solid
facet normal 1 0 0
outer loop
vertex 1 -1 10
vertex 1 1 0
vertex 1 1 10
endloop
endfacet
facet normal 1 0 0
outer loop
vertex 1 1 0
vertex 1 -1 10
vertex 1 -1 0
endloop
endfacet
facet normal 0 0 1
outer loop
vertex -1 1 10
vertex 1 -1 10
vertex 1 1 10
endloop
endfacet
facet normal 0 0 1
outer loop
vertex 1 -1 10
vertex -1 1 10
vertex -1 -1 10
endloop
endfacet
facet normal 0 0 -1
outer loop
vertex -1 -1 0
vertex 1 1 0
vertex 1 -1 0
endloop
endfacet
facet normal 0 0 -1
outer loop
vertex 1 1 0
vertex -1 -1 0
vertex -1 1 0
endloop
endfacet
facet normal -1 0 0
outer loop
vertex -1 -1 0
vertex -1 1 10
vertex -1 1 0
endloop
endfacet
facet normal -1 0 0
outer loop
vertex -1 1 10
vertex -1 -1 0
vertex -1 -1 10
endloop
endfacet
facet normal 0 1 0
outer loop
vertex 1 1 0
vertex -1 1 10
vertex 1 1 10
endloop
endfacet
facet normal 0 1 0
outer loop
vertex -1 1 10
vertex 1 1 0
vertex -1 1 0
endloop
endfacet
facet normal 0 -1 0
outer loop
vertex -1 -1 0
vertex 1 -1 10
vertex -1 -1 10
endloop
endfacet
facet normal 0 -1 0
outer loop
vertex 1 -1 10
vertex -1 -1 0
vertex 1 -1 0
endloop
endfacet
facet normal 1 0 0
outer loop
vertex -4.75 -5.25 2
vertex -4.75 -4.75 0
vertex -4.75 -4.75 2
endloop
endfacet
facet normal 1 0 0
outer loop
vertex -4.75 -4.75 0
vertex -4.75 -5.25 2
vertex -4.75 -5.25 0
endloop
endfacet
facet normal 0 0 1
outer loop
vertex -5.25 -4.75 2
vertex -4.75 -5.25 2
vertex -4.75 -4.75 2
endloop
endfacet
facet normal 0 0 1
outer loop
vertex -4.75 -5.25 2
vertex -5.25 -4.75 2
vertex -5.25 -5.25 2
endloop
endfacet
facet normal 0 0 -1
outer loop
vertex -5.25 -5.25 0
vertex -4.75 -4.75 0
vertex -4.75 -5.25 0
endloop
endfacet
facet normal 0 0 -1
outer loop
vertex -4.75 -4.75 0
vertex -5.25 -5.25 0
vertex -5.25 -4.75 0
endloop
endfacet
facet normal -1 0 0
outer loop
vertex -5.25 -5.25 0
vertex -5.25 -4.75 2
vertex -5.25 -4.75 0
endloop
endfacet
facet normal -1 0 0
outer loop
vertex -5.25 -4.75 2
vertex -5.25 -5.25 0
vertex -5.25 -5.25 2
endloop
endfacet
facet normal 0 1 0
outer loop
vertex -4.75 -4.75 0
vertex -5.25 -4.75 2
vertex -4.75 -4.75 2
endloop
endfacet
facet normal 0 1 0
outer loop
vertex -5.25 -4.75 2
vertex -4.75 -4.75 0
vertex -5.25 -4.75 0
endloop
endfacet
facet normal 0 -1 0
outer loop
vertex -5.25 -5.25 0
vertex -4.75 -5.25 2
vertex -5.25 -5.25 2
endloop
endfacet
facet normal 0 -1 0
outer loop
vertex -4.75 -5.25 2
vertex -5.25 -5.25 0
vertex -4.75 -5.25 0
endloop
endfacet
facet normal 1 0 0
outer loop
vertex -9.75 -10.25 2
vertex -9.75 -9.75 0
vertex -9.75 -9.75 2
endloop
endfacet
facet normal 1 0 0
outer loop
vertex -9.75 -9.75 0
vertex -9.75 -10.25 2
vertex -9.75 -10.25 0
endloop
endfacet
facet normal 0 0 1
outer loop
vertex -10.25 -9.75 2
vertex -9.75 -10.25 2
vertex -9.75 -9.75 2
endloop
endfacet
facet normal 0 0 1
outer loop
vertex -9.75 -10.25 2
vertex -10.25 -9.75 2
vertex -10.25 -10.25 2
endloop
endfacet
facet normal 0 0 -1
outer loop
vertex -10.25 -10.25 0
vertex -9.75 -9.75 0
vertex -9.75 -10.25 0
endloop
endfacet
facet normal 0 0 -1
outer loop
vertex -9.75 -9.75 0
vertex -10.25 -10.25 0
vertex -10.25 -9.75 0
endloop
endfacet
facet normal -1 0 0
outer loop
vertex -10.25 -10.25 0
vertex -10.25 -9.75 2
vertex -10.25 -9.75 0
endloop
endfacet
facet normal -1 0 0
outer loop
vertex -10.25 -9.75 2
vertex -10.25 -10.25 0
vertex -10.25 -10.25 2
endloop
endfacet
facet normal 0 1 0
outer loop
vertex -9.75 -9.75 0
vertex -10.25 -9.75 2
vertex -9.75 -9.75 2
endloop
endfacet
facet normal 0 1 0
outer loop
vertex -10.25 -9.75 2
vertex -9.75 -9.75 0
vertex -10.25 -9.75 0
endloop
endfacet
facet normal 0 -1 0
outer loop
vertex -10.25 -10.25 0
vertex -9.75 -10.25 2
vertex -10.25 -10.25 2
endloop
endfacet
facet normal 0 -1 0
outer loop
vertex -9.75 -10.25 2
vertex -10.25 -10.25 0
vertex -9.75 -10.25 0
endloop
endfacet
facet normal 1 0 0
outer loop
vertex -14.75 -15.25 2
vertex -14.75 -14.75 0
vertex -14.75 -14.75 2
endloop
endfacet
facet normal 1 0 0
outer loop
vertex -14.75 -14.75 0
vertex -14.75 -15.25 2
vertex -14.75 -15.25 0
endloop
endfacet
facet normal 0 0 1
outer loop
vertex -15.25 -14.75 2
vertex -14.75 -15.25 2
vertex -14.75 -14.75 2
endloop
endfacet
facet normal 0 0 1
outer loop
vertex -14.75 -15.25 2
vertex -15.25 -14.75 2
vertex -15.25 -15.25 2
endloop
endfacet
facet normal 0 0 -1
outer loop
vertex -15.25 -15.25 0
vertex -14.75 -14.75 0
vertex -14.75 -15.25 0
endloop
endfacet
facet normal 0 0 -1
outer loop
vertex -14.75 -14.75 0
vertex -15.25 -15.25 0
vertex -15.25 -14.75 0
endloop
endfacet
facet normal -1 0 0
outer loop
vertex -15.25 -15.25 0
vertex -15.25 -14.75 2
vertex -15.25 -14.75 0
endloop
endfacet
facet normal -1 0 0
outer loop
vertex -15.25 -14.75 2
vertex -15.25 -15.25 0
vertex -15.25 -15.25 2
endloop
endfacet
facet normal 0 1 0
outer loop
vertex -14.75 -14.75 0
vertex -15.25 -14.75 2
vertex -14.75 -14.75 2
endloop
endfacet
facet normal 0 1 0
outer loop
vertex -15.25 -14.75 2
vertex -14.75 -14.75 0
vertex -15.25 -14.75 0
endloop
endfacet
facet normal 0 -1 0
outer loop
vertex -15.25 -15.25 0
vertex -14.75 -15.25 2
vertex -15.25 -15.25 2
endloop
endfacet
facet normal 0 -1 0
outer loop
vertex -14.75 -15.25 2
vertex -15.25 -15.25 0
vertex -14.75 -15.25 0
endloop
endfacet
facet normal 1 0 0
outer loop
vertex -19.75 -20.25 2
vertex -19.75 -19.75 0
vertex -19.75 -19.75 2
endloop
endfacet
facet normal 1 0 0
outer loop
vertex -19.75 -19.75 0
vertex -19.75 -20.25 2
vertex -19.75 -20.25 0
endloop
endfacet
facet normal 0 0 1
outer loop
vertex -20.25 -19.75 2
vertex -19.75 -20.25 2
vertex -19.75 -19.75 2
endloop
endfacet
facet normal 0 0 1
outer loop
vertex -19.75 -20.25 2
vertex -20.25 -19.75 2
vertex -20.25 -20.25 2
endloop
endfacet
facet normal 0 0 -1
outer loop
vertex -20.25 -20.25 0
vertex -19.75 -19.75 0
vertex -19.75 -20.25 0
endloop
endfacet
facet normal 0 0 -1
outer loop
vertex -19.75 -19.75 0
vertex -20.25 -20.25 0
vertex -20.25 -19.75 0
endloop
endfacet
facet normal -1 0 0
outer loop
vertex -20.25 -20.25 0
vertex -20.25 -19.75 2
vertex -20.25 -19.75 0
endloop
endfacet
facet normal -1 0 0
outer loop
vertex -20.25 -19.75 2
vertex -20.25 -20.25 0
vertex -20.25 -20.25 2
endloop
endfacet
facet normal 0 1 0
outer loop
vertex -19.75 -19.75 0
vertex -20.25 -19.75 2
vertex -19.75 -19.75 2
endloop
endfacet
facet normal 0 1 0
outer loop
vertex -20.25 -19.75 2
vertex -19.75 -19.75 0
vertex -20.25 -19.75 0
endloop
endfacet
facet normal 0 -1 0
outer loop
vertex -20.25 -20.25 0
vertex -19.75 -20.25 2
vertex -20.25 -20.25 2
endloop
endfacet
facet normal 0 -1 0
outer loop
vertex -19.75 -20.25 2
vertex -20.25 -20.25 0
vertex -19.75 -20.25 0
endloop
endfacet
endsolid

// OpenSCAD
translate([0, 0, 5]) color([0,1,0,0.9]) cube([2, 2, 10], center=true);
translate([-5.0, -5.0, 1]) color([1,0,0]) cube([0.5, 0.5, 2], center=true);
translate([-10.0, -10.0, 1]) color([1,0,0]) cube([0.5, 0.5, 2], center=true);
translate([-15.0, -15.0, 1]) color([1,0,0]) cube([0.5, 0.5, 2], center=true);
translate([-20.0, -20.0, 1]) color([1,0,0]) cube([0.5, 0.5, 2], center=true);
